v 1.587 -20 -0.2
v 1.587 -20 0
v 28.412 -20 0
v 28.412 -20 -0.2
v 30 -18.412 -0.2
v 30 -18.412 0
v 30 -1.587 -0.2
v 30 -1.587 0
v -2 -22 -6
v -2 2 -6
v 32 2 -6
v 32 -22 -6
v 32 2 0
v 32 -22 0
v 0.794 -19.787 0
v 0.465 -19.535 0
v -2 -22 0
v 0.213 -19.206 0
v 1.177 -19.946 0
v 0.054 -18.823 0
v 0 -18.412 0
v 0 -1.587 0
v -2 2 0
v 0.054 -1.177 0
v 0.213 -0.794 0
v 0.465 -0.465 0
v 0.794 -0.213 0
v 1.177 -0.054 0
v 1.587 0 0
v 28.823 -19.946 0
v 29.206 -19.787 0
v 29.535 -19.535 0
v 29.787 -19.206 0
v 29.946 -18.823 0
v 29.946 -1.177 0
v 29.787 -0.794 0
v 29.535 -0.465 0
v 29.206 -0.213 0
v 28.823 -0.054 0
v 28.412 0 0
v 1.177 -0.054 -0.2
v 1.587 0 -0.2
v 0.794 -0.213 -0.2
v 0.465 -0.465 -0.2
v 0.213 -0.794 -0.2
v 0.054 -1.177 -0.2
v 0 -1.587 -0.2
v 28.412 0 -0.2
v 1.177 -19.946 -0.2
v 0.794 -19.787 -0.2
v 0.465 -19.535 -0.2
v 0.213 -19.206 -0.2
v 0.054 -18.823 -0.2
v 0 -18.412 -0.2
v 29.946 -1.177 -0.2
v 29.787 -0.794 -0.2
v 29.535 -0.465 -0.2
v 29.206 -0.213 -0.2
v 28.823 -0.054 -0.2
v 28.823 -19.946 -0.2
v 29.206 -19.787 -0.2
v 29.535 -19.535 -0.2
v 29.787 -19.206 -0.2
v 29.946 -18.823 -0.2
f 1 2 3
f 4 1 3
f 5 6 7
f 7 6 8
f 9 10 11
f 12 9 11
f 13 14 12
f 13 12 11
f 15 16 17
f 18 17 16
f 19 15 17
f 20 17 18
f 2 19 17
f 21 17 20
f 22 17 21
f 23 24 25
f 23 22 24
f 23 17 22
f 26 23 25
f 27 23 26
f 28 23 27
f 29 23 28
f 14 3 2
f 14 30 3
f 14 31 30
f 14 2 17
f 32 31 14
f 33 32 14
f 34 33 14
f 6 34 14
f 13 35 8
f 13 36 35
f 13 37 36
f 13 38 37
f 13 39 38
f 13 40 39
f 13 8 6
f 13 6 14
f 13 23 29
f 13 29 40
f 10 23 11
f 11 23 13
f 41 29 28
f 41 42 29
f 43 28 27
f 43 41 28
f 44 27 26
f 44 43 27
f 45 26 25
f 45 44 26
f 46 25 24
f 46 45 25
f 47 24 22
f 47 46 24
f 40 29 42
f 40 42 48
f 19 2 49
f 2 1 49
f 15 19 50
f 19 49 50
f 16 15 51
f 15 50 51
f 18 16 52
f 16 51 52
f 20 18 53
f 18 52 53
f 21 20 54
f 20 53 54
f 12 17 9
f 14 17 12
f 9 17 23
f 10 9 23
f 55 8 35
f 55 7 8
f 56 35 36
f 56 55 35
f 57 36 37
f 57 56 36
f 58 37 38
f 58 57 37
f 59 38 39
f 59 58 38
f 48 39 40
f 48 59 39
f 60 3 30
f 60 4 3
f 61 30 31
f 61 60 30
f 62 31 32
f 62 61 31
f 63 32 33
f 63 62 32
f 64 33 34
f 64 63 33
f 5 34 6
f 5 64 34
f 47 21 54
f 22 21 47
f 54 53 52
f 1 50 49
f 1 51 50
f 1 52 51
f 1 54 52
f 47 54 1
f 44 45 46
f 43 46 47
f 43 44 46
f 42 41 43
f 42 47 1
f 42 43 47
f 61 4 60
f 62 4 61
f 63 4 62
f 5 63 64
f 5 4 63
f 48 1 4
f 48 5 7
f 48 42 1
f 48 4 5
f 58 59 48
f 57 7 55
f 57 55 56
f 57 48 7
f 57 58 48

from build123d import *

# Parameters (mm, degrees)
F0_W     = 34
F0_H     = 24
F0_W_2   = 30
F0_H_2   = 20
F1_DEPTH = 6
F2_DEPTH = 0.2
F3_R     = 1.5875


with BuildPart() as f1:
    # F0 (on Top) → F1 (new body)
    with BuildSketch(Plane.XY):
        with Locations((15, -10)):
            Rectangle(F0_W, F0_H)
        with Locations((15, -10)):
            Rectangle(F0_W_2, F0_H_2, mode=Mode.SUBTRACT)
        with Locations((15, -10)):
            Rectangle(F0_W_2, F0_H_2)
    extrude(amount=-F1_DEPTH)

    # F0 (on Top) → F2 (cut)
    with BuildSketch(Plane.XY):
        with Locations((15, -10)):
            Rectangle(F0_W_2, F0_H_2)
    extrude(amount=-F2_DEPTH, mode=Mode.SUBTRACT)

    # F3
    f3_edges = [f1.edges().sort_by_distance(p)[0] for p in [
        (0, 0, -0.1),
        (30, 0, -0.1),
        (30, -20, -0.1),
        (0, -20, -0.1),
    ]]
    fillet(f3_edges, radius=F3_R)


solid = f1.part
